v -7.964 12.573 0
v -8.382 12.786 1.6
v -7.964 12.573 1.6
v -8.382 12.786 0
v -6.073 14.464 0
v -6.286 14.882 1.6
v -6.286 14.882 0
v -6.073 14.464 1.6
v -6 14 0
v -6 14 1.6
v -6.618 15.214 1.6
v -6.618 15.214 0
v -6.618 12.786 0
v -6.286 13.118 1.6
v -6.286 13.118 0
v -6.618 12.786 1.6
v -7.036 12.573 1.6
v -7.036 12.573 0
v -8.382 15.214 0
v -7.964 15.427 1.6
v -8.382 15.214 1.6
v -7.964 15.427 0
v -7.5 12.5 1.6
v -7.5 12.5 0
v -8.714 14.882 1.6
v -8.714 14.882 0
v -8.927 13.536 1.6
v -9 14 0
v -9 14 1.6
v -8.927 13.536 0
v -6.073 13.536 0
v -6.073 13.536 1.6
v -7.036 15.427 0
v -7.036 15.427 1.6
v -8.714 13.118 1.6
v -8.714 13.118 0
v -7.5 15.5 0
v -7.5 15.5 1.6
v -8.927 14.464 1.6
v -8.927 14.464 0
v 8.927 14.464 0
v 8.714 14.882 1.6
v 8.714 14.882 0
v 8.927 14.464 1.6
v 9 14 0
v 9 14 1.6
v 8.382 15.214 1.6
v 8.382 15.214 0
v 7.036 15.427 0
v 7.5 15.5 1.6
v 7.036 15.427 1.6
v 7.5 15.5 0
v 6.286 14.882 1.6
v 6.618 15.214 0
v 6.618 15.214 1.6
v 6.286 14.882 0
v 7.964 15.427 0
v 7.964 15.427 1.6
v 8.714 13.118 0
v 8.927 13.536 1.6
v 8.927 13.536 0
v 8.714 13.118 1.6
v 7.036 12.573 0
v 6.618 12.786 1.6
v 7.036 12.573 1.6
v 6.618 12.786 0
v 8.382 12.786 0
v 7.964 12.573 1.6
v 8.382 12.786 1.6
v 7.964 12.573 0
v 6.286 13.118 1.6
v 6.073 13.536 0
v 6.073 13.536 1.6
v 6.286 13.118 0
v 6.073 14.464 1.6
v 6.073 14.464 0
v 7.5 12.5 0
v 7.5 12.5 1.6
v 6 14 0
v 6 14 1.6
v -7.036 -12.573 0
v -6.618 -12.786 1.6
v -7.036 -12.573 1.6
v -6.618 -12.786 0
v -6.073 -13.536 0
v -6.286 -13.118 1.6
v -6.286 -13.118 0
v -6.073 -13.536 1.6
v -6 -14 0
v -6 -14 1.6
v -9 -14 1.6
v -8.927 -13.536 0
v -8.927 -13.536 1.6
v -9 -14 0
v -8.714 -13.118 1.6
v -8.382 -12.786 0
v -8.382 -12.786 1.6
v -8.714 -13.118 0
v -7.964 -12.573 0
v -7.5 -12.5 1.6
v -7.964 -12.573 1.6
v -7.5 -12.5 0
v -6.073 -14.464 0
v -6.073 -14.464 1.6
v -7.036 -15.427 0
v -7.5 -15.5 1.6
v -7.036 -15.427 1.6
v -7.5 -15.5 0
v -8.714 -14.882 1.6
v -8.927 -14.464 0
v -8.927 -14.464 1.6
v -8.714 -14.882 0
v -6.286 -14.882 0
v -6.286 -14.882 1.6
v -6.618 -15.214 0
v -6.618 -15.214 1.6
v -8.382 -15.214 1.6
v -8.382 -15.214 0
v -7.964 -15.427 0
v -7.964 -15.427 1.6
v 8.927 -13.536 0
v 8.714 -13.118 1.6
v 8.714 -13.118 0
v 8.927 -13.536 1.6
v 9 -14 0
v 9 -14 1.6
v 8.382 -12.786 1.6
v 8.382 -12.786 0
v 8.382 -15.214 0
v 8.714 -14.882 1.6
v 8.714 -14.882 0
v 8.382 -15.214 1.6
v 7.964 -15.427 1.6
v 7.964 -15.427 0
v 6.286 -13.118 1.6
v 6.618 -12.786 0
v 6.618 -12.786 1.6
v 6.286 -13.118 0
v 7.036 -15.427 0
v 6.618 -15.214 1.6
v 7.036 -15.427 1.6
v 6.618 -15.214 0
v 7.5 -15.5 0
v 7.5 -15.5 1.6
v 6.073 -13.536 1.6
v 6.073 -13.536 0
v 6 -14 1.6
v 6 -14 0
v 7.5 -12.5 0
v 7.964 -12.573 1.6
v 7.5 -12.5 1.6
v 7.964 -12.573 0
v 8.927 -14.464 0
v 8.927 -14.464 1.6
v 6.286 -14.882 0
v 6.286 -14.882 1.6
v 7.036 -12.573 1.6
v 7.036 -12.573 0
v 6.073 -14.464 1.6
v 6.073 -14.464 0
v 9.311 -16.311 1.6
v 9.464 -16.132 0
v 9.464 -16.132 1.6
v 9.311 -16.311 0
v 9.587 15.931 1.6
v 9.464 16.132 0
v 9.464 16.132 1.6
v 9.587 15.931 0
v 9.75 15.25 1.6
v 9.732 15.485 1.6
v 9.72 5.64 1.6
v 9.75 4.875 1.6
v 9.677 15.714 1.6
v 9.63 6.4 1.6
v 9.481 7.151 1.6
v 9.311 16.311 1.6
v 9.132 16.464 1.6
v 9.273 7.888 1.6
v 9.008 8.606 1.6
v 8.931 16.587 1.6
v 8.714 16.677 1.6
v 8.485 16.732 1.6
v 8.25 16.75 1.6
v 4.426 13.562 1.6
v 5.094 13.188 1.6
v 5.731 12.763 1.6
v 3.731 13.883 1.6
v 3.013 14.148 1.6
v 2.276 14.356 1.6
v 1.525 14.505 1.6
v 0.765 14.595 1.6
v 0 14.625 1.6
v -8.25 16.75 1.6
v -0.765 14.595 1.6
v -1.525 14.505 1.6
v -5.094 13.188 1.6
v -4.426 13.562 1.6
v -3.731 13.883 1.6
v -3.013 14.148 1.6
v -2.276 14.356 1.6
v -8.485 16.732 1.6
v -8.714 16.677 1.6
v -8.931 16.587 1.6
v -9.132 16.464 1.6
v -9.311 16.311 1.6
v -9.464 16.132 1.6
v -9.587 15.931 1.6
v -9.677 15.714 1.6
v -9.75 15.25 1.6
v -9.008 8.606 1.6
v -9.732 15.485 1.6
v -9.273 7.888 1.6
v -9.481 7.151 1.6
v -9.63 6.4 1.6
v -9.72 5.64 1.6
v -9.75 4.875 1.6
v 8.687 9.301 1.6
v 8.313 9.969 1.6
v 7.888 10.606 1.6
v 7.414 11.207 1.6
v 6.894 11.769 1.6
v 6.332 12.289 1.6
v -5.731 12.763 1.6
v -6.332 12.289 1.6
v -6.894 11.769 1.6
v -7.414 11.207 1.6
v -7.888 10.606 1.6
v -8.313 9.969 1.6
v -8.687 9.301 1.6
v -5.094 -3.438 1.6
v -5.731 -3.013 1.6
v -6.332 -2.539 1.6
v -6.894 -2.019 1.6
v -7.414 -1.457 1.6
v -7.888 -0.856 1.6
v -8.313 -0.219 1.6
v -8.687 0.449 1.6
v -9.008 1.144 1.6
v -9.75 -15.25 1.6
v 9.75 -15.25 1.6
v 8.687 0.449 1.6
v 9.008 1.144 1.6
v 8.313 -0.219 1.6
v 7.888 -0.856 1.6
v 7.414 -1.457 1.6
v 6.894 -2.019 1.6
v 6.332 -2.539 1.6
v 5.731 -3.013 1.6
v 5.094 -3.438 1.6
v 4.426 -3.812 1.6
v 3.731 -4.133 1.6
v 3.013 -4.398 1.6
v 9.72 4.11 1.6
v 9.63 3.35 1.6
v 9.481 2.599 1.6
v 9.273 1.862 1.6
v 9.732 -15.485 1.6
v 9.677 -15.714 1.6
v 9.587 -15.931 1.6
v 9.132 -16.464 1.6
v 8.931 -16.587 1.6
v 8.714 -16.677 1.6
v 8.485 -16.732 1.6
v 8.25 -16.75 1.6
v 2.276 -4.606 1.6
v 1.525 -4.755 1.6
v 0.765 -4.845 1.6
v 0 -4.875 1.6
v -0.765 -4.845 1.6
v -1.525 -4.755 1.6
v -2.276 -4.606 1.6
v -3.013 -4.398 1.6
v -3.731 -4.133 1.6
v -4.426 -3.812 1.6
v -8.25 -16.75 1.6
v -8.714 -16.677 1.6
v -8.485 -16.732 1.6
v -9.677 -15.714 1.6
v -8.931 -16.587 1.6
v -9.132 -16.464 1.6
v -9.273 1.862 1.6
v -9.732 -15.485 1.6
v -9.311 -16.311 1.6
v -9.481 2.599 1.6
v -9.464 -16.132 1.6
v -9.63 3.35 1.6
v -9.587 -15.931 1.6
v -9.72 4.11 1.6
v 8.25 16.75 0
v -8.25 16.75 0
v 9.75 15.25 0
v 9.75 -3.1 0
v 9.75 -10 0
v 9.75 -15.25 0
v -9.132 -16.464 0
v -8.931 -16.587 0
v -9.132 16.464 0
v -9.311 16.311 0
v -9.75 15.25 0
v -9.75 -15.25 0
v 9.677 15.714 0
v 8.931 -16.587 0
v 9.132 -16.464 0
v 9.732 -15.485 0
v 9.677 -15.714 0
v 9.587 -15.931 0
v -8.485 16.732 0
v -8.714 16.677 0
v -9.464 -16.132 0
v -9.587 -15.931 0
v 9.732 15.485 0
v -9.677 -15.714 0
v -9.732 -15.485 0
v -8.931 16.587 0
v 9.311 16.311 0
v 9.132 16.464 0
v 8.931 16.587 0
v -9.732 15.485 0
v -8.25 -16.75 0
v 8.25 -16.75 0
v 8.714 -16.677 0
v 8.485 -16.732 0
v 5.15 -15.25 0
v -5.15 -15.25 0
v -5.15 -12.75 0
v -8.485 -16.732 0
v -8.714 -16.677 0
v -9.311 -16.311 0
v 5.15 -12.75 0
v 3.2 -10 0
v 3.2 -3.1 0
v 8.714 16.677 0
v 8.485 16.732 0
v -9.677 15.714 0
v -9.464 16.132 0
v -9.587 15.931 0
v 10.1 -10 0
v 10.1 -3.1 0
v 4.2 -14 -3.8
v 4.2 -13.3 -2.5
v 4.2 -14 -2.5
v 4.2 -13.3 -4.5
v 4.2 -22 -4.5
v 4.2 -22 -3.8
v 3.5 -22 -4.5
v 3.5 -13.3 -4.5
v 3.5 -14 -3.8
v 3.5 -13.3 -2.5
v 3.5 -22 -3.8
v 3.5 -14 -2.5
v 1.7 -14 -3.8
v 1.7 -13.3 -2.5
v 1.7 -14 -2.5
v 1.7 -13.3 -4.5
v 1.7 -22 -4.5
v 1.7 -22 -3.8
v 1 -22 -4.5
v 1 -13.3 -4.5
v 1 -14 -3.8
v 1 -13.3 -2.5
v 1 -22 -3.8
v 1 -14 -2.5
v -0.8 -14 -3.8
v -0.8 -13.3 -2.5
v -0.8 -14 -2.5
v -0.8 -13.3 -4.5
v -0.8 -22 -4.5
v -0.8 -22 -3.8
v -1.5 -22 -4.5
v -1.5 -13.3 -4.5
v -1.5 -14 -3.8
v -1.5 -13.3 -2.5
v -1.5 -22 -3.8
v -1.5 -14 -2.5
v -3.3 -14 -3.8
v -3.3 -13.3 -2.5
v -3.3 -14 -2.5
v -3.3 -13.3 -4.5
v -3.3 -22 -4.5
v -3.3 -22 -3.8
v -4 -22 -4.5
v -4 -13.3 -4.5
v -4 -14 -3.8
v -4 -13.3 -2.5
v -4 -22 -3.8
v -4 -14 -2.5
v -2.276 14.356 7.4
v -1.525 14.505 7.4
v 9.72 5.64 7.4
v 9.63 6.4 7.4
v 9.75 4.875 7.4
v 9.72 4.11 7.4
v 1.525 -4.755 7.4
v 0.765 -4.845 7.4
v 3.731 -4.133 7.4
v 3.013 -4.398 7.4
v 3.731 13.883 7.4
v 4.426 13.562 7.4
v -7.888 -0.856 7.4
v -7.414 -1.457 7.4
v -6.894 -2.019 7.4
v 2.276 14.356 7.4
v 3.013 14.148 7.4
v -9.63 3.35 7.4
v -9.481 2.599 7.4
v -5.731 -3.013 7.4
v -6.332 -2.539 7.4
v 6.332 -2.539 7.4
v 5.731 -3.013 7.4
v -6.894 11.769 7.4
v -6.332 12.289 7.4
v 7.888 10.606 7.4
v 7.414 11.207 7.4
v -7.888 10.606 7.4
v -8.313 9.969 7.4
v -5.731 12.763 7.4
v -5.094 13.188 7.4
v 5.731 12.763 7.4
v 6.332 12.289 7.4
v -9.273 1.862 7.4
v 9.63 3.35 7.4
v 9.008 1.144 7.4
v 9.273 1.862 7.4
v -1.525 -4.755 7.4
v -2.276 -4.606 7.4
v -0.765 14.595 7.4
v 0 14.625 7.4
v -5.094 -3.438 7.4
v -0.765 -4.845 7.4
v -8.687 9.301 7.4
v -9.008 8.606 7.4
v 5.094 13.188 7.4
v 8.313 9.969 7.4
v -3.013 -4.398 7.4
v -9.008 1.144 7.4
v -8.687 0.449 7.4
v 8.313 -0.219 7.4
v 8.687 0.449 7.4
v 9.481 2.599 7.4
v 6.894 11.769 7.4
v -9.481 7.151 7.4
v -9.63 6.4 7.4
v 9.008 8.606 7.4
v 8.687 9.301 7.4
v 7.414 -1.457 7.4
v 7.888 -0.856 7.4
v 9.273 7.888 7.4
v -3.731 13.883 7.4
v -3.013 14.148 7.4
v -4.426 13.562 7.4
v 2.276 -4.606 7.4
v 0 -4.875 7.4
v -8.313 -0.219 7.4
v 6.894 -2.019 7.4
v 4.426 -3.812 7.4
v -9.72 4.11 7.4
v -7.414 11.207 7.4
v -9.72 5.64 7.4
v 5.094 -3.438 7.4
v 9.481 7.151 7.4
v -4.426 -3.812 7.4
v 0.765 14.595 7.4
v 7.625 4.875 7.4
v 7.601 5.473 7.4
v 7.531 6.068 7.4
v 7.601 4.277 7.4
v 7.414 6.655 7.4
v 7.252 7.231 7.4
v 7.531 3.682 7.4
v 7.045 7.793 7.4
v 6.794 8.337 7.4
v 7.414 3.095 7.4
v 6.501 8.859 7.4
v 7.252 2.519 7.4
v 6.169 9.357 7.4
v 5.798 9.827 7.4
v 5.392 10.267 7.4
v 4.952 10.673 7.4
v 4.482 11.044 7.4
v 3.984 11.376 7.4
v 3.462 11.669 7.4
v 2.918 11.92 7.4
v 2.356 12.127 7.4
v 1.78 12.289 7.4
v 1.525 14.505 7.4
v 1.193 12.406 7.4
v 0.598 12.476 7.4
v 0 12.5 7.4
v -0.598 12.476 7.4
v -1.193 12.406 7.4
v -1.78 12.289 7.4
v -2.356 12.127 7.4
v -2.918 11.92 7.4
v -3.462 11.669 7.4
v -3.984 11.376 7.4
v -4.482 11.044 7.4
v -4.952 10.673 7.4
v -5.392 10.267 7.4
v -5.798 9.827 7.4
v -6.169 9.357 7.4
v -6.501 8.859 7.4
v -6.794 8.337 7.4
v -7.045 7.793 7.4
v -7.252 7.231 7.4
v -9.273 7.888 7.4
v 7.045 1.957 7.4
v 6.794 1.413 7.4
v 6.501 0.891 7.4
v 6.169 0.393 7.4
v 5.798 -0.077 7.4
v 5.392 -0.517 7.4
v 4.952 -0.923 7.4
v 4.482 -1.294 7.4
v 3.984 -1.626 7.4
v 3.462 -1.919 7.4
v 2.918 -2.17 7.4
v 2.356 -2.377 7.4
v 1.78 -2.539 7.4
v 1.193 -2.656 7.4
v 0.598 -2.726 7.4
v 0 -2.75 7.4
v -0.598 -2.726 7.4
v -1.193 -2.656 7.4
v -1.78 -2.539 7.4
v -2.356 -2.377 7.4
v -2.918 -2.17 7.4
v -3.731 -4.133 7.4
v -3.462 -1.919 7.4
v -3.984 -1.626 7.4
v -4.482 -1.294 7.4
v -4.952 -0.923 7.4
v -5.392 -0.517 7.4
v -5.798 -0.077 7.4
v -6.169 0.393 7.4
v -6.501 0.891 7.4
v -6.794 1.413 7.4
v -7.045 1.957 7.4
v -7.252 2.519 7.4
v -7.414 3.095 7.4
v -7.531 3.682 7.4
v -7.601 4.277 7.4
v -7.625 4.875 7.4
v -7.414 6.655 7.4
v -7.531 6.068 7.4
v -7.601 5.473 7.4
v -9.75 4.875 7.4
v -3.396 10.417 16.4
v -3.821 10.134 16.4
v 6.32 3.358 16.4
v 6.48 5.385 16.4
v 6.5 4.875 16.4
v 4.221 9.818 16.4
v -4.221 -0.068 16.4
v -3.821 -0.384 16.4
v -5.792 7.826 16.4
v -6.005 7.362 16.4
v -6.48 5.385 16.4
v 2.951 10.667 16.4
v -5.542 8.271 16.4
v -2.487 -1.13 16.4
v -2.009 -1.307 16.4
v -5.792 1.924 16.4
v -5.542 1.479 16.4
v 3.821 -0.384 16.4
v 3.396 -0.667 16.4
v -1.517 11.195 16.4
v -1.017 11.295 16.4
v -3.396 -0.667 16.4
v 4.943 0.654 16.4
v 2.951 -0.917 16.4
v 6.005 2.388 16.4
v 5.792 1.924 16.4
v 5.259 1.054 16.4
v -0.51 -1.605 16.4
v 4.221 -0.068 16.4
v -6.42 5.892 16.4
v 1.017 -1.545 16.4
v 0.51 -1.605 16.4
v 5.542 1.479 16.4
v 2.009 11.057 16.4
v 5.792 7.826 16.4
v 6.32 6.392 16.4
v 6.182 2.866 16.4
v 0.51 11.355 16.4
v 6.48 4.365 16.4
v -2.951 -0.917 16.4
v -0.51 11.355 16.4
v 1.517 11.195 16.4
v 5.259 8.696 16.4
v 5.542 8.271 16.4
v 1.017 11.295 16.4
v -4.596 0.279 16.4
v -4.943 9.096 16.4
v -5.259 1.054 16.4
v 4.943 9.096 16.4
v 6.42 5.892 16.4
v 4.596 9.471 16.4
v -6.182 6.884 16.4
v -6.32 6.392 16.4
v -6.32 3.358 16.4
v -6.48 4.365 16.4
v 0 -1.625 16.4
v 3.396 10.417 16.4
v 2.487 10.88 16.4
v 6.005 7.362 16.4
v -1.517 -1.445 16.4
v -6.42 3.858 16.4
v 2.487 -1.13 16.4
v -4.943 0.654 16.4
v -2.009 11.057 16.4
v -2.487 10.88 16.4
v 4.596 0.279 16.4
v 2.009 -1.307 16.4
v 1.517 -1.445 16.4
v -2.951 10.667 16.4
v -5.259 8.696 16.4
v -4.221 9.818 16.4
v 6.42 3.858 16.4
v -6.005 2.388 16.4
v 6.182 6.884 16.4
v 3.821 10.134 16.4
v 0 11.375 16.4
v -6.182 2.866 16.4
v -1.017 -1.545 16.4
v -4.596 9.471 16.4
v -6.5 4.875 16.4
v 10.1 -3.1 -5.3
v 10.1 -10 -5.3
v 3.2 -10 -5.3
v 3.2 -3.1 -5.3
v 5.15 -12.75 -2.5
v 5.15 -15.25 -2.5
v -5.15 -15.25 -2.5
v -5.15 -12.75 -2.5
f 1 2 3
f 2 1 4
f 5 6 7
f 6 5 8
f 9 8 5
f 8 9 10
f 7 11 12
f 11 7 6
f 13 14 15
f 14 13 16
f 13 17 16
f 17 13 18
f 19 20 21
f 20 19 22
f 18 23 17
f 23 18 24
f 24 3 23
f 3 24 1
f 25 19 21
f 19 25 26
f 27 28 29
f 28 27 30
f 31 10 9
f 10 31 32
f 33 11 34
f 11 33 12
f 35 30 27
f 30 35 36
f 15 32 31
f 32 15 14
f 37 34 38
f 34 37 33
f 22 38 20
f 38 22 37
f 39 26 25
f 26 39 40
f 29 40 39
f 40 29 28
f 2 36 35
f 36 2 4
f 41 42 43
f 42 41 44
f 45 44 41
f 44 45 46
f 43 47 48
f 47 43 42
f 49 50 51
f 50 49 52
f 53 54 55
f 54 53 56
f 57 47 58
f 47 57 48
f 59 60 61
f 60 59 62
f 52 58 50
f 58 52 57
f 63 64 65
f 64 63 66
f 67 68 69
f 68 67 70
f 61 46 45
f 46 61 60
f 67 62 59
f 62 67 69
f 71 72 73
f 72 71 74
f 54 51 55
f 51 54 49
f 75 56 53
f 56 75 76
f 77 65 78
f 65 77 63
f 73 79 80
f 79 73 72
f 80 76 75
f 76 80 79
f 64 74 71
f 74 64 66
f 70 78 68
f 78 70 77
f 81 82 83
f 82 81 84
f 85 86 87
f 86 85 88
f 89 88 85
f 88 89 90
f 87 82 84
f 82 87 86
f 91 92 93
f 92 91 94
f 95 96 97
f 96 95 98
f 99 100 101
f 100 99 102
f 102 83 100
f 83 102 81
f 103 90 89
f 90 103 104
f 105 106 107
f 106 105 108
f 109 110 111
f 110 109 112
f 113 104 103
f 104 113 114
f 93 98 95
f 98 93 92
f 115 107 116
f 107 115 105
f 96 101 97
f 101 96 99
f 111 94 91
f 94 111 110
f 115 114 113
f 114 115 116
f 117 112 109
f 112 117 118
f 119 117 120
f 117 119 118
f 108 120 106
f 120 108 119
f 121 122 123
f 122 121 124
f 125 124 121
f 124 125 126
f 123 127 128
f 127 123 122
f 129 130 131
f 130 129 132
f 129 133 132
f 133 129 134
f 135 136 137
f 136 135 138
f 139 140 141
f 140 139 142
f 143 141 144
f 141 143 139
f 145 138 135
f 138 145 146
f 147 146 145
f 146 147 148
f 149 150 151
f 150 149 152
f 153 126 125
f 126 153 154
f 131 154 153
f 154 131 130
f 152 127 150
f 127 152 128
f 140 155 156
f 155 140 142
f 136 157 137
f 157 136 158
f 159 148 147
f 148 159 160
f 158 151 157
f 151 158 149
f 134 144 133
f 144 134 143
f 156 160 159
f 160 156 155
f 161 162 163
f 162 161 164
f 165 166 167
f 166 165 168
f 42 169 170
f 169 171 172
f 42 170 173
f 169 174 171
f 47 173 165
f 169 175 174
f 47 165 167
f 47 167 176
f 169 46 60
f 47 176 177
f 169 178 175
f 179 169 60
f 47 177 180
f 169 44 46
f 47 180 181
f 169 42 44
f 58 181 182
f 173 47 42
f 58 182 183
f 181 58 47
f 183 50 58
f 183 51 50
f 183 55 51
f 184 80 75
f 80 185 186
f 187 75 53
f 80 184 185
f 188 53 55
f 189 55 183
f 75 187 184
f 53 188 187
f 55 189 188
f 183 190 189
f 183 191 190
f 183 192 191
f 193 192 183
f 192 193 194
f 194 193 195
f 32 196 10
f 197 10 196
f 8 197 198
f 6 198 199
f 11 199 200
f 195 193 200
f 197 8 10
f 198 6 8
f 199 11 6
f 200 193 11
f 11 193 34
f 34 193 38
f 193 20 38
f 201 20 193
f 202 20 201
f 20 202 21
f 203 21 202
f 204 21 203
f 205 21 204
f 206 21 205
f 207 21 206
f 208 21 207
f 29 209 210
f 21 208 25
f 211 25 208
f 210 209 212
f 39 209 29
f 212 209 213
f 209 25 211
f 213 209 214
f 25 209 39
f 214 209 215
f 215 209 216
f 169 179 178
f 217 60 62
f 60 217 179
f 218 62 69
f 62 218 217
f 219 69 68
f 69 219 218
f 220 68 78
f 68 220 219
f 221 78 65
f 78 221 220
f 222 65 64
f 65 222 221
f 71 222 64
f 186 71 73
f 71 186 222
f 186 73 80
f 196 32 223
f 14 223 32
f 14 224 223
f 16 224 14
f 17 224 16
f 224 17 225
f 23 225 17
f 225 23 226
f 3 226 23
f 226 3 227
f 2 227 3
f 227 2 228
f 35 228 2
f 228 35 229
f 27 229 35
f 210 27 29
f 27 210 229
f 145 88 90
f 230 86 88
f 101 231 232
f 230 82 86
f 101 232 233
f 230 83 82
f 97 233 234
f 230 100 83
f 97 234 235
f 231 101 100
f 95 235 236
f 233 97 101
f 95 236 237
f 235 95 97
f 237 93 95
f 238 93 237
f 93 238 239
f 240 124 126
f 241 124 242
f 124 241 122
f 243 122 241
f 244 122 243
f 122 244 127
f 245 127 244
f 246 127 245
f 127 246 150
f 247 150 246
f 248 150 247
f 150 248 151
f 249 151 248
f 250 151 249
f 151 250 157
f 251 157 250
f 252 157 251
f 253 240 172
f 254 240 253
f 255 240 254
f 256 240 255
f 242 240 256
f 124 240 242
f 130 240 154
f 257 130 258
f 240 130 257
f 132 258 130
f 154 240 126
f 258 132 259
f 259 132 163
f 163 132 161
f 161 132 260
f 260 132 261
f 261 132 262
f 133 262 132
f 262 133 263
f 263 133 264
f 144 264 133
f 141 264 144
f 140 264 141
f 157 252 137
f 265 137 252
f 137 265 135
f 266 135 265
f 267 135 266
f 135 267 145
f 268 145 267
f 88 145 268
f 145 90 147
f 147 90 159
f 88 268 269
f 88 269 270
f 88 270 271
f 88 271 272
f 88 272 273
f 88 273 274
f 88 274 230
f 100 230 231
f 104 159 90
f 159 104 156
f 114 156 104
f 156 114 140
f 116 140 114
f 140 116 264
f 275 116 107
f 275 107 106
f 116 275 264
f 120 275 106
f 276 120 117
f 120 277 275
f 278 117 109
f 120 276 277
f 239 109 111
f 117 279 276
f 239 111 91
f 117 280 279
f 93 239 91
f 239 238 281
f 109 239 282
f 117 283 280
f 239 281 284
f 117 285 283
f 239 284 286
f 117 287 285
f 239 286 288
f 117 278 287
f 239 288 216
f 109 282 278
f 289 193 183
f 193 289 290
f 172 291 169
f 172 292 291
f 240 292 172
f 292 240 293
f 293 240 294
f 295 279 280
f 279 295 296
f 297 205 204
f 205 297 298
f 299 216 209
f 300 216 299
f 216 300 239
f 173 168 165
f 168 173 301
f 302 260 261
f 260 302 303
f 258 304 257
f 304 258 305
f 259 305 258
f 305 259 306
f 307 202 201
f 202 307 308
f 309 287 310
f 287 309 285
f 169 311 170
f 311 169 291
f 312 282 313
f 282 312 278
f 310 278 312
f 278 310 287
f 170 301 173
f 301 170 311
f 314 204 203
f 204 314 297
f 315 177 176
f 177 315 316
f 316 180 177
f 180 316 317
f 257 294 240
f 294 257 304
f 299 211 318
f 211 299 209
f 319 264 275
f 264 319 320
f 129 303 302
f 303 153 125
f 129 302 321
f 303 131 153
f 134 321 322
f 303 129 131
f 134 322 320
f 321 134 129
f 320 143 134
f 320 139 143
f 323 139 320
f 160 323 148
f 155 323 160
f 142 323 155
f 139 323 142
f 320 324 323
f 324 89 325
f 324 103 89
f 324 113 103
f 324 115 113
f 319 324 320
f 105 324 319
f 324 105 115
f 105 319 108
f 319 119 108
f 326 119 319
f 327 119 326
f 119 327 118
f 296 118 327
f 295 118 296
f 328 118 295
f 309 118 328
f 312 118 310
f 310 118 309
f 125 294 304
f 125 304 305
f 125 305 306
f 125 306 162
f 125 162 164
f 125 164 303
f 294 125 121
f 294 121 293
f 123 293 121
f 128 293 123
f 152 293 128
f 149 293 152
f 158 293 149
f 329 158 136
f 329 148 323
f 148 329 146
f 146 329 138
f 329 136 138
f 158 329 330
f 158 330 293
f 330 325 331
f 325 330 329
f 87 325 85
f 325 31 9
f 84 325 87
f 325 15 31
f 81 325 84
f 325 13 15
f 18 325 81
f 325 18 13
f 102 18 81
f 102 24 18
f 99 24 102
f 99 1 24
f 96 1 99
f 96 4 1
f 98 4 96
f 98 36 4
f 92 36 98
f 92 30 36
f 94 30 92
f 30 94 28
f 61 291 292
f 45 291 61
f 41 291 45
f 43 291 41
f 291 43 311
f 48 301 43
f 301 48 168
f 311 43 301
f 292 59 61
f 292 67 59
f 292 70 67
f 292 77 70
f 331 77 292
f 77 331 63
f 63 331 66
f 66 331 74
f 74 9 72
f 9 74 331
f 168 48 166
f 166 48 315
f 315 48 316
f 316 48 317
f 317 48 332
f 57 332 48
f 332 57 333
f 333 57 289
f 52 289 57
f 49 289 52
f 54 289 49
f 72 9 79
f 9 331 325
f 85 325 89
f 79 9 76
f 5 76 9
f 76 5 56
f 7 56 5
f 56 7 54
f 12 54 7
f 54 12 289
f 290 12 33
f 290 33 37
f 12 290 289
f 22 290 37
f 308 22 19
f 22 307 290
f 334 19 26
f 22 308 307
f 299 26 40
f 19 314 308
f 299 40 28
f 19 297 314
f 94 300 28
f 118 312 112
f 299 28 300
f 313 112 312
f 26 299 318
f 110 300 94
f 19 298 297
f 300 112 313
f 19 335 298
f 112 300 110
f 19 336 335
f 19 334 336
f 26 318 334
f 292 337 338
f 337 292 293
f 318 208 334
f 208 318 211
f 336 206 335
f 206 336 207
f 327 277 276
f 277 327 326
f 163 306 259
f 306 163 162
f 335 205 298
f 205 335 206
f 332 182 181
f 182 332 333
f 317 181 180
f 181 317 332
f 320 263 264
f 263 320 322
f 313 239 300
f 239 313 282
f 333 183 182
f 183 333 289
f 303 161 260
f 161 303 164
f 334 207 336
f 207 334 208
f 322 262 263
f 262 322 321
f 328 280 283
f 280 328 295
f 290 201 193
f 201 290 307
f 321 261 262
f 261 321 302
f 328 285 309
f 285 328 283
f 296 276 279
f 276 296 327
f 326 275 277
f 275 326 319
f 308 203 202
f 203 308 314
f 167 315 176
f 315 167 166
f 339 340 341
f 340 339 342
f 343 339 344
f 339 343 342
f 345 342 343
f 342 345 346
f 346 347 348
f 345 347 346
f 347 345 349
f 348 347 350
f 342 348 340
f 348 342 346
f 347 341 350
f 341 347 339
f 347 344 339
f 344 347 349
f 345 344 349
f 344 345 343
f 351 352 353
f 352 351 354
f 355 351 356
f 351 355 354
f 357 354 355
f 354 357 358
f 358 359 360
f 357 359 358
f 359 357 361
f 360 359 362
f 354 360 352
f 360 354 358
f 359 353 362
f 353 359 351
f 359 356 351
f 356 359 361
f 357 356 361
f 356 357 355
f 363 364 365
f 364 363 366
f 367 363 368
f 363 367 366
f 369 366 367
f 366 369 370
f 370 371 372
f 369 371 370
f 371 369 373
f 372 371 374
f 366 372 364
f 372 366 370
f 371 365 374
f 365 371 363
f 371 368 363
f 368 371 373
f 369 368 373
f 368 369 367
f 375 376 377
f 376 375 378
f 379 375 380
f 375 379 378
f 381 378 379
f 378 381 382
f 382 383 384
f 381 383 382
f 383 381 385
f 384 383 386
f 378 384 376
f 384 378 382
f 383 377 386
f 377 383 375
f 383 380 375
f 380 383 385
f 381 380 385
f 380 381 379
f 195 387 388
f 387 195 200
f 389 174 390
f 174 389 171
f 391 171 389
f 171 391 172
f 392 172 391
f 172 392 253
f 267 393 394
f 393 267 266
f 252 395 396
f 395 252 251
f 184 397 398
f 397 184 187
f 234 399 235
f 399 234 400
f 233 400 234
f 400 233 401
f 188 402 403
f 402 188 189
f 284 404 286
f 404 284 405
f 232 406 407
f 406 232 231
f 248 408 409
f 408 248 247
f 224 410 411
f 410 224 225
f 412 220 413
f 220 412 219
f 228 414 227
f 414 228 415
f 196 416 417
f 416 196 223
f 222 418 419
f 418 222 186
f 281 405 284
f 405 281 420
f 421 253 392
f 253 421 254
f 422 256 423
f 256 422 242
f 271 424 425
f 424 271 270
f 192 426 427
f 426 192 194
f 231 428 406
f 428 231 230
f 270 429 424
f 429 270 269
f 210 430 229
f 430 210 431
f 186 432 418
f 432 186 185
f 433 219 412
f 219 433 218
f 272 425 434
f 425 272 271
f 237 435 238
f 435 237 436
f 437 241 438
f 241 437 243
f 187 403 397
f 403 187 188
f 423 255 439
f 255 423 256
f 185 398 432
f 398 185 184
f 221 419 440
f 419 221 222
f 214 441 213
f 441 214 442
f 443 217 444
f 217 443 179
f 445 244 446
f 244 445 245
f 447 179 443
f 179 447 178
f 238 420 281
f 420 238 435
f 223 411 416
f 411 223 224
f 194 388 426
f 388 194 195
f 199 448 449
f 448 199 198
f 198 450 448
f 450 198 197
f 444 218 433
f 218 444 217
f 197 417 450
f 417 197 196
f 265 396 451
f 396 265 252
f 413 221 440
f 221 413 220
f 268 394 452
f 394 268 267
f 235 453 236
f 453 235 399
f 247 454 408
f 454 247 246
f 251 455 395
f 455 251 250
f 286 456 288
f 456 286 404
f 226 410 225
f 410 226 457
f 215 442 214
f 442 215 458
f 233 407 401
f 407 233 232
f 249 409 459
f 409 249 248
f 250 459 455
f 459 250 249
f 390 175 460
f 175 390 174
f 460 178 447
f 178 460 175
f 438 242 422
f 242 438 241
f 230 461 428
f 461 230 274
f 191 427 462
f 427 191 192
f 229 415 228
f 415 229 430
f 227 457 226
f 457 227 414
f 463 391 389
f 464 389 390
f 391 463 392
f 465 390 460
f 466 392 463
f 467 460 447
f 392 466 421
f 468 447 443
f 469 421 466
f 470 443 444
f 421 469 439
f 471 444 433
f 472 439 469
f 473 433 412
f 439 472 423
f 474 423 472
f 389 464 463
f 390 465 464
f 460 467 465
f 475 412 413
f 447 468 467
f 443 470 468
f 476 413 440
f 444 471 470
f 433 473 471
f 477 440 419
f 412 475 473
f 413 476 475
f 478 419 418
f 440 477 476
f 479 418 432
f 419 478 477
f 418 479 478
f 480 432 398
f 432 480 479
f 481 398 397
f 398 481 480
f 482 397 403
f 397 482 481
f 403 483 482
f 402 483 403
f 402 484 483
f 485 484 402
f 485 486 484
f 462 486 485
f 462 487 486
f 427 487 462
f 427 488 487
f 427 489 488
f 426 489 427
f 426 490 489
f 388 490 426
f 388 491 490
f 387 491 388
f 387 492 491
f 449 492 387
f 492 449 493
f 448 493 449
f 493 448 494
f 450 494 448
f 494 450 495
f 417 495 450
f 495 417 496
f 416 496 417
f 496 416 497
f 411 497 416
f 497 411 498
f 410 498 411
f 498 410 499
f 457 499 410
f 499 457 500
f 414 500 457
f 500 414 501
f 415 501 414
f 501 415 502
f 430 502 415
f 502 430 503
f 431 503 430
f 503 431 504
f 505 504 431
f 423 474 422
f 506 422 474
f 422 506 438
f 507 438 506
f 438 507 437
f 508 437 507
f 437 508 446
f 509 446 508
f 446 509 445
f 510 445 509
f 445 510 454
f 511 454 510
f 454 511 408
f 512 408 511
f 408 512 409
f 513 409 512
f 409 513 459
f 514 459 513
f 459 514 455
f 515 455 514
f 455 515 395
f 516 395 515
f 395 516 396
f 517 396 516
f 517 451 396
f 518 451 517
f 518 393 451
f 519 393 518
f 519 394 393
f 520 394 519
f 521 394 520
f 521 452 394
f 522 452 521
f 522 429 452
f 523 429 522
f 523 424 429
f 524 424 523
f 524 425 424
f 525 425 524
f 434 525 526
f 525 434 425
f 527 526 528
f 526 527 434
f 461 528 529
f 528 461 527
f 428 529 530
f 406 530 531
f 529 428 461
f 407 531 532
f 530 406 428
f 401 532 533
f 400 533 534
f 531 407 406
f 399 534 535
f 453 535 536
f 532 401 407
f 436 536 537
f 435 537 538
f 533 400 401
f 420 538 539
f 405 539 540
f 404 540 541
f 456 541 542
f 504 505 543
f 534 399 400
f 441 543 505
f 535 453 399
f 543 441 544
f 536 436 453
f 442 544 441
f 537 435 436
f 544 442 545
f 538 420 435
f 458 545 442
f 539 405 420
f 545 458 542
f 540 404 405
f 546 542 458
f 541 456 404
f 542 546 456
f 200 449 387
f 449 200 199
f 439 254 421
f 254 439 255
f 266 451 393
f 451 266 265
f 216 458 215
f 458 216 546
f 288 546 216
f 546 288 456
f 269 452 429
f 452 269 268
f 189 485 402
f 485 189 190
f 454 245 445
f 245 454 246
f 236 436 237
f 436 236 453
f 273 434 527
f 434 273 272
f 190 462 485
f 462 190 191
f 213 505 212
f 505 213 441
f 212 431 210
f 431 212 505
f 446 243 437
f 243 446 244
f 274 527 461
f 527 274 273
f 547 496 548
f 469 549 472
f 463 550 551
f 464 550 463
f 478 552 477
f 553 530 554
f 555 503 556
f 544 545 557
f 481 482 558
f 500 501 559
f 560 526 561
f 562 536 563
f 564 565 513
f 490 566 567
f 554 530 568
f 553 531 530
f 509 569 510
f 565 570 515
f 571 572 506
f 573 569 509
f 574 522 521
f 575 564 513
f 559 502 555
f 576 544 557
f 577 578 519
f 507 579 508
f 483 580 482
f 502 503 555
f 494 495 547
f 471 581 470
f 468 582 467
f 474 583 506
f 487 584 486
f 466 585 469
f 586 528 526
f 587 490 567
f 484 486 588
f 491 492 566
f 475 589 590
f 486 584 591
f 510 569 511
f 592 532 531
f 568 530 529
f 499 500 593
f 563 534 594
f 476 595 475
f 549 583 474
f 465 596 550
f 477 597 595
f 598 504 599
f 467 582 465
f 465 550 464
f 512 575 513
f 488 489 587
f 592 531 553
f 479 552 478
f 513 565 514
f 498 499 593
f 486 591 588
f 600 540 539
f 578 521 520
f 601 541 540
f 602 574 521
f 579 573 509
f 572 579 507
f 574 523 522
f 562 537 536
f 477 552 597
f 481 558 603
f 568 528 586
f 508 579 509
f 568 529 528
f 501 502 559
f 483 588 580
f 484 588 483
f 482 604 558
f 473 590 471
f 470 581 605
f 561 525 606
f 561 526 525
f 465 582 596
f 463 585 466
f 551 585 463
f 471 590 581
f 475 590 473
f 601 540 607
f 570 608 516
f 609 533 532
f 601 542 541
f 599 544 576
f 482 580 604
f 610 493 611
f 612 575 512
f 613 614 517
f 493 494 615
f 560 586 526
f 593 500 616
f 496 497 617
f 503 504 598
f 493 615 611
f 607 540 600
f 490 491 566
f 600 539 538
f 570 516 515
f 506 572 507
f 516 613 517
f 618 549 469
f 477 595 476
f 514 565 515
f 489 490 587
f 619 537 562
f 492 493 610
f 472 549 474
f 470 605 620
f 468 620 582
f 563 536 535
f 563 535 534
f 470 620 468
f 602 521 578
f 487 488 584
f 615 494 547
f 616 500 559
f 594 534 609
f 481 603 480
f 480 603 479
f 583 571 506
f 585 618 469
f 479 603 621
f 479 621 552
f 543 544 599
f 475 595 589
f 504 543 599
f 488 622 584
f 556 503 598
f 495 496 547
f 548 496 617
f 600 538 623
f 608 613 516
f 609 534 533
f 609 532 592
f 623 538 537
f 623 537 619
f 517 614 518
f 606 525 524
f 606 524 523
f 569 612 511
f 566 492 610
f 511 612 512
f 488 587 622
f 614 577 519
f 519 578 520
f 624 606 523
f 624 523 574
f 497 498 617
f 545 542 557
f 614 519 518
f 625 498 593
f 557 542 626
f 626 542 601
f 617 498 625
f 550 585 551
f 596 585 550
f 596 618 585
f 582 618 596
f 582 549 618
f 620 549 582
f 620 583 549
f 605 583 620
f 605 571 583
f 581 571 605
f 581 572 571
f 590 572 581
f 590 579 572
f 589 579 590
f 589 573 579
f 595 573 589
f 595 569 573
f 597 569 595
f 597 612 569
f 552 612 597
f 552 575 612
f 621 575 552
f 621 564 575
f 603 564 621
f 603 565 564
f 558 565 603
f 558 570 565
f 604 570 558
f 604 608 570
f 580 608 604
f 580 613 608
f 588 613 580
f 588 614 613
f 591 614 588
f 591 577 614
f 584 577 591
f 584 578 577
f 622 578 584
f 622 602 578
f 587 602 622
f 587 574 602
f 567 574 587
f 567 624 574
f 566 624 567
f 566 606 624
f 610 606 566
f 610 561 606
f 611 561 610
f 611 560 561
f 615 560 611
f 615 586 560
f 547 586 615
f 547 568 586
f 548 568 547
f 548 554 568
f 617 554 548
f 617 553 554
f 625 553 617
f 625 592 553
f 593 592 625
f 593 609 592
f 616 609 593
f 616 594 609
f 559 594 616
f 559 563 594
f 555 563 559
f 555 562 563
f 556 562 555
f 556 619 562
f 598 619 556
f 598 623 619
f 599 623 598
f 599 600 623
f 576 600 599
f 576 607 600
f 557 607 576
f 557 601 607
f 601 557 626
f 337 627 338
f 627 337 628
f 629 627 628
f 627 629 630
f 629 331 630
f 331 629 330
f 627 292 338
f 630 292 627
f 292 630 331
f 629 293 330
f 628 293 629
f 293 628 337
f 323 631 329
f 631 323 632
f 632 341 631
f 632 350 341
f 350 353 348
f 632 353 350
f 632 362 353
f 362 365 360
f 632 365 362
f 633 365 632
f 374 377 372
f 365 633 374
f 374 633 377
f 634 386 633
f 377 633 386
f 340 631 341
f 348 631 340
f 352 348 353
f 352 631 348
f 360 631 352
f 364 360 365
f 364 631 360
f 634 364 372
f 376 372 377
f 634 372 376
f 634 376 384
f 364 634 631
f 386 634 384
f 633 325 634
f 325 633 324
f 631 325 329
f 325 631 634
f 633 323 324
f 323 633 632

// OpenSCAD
q=4;

module rcube(siz, rad) {
    xi = max(0,siz[0]/2-rad);
    yi = max(0,siz[1]/2-rad);
    hi =  siz[2];

    hull() {
        translate([ xi, yi,0]) cylinder(r=rad,h=hi, center=true, $fn=10*q);
        translate([-xi, yi,0]) cylinder(r=rad,h=hi, center=true, $fn=10*q);
        translate([ xi,-yi,0]) cylinder(r=rad,h=hi, center=true, $fn=10*q);
        translate([-xi,-yi,0]) cylinder(r=rad,h=hi, center=true, $fn=10*q);
  }
}

module MQ2Fix(di) {
    translate([-7.5, 14.0,0]) cylinder(d=di,h=6, center=true, $fn=5*q);
    translate([ 7.5, 14.0,0]) cylinder(d=di,h=6, center=true, $fn=5*q);
    translate([-7.5,-14.0,0]) cylinder(d=di,h=6, center=true, $fn=5*q);
    translate([ 7.5,-14.0,0]) cylinder(d=di,h=6, center=true, $fn=5*q);
}

module MQ2() {
    difference() {
        color("DarkBlue") translate([0,0,0.8]) rcube([19.5,33.5,1.6], 1.5);
        MQ2Fix(3);
    }
    color("Silver"     ) translate([0  ,15-(19.0+1.25)/2,    1.6]) cylinder(d =19.5       ,h=5.8,$fn=20*q);
    color("Grey"       ) translate([0  ,15-(19.0+1.25)/2,5.8+1.6]) cylinder(d1=15.25,d2=13,h=9.0,$fn=20*q);
    color("Blue"       ) translate([3.2,-10             ,-5.3   ]) cube([6.9,6.9,5.3]);
    color([0.1,0.1,0.1]) translate([0  ,-14             ,-1.25  ]) cube([10.3,2.5,2.5], center=true);
    color("Goldenrod"     ) for(i = [1:4]) {
        translate([ 6-2.5*i  ,-14,-4.5]) cube([0.7,0.7,4.5]);
        translate([ 6-2.5*i  ,-22,-4.5]) cube([0.7,8  ,0.7]);
    }
}

MQ2();
